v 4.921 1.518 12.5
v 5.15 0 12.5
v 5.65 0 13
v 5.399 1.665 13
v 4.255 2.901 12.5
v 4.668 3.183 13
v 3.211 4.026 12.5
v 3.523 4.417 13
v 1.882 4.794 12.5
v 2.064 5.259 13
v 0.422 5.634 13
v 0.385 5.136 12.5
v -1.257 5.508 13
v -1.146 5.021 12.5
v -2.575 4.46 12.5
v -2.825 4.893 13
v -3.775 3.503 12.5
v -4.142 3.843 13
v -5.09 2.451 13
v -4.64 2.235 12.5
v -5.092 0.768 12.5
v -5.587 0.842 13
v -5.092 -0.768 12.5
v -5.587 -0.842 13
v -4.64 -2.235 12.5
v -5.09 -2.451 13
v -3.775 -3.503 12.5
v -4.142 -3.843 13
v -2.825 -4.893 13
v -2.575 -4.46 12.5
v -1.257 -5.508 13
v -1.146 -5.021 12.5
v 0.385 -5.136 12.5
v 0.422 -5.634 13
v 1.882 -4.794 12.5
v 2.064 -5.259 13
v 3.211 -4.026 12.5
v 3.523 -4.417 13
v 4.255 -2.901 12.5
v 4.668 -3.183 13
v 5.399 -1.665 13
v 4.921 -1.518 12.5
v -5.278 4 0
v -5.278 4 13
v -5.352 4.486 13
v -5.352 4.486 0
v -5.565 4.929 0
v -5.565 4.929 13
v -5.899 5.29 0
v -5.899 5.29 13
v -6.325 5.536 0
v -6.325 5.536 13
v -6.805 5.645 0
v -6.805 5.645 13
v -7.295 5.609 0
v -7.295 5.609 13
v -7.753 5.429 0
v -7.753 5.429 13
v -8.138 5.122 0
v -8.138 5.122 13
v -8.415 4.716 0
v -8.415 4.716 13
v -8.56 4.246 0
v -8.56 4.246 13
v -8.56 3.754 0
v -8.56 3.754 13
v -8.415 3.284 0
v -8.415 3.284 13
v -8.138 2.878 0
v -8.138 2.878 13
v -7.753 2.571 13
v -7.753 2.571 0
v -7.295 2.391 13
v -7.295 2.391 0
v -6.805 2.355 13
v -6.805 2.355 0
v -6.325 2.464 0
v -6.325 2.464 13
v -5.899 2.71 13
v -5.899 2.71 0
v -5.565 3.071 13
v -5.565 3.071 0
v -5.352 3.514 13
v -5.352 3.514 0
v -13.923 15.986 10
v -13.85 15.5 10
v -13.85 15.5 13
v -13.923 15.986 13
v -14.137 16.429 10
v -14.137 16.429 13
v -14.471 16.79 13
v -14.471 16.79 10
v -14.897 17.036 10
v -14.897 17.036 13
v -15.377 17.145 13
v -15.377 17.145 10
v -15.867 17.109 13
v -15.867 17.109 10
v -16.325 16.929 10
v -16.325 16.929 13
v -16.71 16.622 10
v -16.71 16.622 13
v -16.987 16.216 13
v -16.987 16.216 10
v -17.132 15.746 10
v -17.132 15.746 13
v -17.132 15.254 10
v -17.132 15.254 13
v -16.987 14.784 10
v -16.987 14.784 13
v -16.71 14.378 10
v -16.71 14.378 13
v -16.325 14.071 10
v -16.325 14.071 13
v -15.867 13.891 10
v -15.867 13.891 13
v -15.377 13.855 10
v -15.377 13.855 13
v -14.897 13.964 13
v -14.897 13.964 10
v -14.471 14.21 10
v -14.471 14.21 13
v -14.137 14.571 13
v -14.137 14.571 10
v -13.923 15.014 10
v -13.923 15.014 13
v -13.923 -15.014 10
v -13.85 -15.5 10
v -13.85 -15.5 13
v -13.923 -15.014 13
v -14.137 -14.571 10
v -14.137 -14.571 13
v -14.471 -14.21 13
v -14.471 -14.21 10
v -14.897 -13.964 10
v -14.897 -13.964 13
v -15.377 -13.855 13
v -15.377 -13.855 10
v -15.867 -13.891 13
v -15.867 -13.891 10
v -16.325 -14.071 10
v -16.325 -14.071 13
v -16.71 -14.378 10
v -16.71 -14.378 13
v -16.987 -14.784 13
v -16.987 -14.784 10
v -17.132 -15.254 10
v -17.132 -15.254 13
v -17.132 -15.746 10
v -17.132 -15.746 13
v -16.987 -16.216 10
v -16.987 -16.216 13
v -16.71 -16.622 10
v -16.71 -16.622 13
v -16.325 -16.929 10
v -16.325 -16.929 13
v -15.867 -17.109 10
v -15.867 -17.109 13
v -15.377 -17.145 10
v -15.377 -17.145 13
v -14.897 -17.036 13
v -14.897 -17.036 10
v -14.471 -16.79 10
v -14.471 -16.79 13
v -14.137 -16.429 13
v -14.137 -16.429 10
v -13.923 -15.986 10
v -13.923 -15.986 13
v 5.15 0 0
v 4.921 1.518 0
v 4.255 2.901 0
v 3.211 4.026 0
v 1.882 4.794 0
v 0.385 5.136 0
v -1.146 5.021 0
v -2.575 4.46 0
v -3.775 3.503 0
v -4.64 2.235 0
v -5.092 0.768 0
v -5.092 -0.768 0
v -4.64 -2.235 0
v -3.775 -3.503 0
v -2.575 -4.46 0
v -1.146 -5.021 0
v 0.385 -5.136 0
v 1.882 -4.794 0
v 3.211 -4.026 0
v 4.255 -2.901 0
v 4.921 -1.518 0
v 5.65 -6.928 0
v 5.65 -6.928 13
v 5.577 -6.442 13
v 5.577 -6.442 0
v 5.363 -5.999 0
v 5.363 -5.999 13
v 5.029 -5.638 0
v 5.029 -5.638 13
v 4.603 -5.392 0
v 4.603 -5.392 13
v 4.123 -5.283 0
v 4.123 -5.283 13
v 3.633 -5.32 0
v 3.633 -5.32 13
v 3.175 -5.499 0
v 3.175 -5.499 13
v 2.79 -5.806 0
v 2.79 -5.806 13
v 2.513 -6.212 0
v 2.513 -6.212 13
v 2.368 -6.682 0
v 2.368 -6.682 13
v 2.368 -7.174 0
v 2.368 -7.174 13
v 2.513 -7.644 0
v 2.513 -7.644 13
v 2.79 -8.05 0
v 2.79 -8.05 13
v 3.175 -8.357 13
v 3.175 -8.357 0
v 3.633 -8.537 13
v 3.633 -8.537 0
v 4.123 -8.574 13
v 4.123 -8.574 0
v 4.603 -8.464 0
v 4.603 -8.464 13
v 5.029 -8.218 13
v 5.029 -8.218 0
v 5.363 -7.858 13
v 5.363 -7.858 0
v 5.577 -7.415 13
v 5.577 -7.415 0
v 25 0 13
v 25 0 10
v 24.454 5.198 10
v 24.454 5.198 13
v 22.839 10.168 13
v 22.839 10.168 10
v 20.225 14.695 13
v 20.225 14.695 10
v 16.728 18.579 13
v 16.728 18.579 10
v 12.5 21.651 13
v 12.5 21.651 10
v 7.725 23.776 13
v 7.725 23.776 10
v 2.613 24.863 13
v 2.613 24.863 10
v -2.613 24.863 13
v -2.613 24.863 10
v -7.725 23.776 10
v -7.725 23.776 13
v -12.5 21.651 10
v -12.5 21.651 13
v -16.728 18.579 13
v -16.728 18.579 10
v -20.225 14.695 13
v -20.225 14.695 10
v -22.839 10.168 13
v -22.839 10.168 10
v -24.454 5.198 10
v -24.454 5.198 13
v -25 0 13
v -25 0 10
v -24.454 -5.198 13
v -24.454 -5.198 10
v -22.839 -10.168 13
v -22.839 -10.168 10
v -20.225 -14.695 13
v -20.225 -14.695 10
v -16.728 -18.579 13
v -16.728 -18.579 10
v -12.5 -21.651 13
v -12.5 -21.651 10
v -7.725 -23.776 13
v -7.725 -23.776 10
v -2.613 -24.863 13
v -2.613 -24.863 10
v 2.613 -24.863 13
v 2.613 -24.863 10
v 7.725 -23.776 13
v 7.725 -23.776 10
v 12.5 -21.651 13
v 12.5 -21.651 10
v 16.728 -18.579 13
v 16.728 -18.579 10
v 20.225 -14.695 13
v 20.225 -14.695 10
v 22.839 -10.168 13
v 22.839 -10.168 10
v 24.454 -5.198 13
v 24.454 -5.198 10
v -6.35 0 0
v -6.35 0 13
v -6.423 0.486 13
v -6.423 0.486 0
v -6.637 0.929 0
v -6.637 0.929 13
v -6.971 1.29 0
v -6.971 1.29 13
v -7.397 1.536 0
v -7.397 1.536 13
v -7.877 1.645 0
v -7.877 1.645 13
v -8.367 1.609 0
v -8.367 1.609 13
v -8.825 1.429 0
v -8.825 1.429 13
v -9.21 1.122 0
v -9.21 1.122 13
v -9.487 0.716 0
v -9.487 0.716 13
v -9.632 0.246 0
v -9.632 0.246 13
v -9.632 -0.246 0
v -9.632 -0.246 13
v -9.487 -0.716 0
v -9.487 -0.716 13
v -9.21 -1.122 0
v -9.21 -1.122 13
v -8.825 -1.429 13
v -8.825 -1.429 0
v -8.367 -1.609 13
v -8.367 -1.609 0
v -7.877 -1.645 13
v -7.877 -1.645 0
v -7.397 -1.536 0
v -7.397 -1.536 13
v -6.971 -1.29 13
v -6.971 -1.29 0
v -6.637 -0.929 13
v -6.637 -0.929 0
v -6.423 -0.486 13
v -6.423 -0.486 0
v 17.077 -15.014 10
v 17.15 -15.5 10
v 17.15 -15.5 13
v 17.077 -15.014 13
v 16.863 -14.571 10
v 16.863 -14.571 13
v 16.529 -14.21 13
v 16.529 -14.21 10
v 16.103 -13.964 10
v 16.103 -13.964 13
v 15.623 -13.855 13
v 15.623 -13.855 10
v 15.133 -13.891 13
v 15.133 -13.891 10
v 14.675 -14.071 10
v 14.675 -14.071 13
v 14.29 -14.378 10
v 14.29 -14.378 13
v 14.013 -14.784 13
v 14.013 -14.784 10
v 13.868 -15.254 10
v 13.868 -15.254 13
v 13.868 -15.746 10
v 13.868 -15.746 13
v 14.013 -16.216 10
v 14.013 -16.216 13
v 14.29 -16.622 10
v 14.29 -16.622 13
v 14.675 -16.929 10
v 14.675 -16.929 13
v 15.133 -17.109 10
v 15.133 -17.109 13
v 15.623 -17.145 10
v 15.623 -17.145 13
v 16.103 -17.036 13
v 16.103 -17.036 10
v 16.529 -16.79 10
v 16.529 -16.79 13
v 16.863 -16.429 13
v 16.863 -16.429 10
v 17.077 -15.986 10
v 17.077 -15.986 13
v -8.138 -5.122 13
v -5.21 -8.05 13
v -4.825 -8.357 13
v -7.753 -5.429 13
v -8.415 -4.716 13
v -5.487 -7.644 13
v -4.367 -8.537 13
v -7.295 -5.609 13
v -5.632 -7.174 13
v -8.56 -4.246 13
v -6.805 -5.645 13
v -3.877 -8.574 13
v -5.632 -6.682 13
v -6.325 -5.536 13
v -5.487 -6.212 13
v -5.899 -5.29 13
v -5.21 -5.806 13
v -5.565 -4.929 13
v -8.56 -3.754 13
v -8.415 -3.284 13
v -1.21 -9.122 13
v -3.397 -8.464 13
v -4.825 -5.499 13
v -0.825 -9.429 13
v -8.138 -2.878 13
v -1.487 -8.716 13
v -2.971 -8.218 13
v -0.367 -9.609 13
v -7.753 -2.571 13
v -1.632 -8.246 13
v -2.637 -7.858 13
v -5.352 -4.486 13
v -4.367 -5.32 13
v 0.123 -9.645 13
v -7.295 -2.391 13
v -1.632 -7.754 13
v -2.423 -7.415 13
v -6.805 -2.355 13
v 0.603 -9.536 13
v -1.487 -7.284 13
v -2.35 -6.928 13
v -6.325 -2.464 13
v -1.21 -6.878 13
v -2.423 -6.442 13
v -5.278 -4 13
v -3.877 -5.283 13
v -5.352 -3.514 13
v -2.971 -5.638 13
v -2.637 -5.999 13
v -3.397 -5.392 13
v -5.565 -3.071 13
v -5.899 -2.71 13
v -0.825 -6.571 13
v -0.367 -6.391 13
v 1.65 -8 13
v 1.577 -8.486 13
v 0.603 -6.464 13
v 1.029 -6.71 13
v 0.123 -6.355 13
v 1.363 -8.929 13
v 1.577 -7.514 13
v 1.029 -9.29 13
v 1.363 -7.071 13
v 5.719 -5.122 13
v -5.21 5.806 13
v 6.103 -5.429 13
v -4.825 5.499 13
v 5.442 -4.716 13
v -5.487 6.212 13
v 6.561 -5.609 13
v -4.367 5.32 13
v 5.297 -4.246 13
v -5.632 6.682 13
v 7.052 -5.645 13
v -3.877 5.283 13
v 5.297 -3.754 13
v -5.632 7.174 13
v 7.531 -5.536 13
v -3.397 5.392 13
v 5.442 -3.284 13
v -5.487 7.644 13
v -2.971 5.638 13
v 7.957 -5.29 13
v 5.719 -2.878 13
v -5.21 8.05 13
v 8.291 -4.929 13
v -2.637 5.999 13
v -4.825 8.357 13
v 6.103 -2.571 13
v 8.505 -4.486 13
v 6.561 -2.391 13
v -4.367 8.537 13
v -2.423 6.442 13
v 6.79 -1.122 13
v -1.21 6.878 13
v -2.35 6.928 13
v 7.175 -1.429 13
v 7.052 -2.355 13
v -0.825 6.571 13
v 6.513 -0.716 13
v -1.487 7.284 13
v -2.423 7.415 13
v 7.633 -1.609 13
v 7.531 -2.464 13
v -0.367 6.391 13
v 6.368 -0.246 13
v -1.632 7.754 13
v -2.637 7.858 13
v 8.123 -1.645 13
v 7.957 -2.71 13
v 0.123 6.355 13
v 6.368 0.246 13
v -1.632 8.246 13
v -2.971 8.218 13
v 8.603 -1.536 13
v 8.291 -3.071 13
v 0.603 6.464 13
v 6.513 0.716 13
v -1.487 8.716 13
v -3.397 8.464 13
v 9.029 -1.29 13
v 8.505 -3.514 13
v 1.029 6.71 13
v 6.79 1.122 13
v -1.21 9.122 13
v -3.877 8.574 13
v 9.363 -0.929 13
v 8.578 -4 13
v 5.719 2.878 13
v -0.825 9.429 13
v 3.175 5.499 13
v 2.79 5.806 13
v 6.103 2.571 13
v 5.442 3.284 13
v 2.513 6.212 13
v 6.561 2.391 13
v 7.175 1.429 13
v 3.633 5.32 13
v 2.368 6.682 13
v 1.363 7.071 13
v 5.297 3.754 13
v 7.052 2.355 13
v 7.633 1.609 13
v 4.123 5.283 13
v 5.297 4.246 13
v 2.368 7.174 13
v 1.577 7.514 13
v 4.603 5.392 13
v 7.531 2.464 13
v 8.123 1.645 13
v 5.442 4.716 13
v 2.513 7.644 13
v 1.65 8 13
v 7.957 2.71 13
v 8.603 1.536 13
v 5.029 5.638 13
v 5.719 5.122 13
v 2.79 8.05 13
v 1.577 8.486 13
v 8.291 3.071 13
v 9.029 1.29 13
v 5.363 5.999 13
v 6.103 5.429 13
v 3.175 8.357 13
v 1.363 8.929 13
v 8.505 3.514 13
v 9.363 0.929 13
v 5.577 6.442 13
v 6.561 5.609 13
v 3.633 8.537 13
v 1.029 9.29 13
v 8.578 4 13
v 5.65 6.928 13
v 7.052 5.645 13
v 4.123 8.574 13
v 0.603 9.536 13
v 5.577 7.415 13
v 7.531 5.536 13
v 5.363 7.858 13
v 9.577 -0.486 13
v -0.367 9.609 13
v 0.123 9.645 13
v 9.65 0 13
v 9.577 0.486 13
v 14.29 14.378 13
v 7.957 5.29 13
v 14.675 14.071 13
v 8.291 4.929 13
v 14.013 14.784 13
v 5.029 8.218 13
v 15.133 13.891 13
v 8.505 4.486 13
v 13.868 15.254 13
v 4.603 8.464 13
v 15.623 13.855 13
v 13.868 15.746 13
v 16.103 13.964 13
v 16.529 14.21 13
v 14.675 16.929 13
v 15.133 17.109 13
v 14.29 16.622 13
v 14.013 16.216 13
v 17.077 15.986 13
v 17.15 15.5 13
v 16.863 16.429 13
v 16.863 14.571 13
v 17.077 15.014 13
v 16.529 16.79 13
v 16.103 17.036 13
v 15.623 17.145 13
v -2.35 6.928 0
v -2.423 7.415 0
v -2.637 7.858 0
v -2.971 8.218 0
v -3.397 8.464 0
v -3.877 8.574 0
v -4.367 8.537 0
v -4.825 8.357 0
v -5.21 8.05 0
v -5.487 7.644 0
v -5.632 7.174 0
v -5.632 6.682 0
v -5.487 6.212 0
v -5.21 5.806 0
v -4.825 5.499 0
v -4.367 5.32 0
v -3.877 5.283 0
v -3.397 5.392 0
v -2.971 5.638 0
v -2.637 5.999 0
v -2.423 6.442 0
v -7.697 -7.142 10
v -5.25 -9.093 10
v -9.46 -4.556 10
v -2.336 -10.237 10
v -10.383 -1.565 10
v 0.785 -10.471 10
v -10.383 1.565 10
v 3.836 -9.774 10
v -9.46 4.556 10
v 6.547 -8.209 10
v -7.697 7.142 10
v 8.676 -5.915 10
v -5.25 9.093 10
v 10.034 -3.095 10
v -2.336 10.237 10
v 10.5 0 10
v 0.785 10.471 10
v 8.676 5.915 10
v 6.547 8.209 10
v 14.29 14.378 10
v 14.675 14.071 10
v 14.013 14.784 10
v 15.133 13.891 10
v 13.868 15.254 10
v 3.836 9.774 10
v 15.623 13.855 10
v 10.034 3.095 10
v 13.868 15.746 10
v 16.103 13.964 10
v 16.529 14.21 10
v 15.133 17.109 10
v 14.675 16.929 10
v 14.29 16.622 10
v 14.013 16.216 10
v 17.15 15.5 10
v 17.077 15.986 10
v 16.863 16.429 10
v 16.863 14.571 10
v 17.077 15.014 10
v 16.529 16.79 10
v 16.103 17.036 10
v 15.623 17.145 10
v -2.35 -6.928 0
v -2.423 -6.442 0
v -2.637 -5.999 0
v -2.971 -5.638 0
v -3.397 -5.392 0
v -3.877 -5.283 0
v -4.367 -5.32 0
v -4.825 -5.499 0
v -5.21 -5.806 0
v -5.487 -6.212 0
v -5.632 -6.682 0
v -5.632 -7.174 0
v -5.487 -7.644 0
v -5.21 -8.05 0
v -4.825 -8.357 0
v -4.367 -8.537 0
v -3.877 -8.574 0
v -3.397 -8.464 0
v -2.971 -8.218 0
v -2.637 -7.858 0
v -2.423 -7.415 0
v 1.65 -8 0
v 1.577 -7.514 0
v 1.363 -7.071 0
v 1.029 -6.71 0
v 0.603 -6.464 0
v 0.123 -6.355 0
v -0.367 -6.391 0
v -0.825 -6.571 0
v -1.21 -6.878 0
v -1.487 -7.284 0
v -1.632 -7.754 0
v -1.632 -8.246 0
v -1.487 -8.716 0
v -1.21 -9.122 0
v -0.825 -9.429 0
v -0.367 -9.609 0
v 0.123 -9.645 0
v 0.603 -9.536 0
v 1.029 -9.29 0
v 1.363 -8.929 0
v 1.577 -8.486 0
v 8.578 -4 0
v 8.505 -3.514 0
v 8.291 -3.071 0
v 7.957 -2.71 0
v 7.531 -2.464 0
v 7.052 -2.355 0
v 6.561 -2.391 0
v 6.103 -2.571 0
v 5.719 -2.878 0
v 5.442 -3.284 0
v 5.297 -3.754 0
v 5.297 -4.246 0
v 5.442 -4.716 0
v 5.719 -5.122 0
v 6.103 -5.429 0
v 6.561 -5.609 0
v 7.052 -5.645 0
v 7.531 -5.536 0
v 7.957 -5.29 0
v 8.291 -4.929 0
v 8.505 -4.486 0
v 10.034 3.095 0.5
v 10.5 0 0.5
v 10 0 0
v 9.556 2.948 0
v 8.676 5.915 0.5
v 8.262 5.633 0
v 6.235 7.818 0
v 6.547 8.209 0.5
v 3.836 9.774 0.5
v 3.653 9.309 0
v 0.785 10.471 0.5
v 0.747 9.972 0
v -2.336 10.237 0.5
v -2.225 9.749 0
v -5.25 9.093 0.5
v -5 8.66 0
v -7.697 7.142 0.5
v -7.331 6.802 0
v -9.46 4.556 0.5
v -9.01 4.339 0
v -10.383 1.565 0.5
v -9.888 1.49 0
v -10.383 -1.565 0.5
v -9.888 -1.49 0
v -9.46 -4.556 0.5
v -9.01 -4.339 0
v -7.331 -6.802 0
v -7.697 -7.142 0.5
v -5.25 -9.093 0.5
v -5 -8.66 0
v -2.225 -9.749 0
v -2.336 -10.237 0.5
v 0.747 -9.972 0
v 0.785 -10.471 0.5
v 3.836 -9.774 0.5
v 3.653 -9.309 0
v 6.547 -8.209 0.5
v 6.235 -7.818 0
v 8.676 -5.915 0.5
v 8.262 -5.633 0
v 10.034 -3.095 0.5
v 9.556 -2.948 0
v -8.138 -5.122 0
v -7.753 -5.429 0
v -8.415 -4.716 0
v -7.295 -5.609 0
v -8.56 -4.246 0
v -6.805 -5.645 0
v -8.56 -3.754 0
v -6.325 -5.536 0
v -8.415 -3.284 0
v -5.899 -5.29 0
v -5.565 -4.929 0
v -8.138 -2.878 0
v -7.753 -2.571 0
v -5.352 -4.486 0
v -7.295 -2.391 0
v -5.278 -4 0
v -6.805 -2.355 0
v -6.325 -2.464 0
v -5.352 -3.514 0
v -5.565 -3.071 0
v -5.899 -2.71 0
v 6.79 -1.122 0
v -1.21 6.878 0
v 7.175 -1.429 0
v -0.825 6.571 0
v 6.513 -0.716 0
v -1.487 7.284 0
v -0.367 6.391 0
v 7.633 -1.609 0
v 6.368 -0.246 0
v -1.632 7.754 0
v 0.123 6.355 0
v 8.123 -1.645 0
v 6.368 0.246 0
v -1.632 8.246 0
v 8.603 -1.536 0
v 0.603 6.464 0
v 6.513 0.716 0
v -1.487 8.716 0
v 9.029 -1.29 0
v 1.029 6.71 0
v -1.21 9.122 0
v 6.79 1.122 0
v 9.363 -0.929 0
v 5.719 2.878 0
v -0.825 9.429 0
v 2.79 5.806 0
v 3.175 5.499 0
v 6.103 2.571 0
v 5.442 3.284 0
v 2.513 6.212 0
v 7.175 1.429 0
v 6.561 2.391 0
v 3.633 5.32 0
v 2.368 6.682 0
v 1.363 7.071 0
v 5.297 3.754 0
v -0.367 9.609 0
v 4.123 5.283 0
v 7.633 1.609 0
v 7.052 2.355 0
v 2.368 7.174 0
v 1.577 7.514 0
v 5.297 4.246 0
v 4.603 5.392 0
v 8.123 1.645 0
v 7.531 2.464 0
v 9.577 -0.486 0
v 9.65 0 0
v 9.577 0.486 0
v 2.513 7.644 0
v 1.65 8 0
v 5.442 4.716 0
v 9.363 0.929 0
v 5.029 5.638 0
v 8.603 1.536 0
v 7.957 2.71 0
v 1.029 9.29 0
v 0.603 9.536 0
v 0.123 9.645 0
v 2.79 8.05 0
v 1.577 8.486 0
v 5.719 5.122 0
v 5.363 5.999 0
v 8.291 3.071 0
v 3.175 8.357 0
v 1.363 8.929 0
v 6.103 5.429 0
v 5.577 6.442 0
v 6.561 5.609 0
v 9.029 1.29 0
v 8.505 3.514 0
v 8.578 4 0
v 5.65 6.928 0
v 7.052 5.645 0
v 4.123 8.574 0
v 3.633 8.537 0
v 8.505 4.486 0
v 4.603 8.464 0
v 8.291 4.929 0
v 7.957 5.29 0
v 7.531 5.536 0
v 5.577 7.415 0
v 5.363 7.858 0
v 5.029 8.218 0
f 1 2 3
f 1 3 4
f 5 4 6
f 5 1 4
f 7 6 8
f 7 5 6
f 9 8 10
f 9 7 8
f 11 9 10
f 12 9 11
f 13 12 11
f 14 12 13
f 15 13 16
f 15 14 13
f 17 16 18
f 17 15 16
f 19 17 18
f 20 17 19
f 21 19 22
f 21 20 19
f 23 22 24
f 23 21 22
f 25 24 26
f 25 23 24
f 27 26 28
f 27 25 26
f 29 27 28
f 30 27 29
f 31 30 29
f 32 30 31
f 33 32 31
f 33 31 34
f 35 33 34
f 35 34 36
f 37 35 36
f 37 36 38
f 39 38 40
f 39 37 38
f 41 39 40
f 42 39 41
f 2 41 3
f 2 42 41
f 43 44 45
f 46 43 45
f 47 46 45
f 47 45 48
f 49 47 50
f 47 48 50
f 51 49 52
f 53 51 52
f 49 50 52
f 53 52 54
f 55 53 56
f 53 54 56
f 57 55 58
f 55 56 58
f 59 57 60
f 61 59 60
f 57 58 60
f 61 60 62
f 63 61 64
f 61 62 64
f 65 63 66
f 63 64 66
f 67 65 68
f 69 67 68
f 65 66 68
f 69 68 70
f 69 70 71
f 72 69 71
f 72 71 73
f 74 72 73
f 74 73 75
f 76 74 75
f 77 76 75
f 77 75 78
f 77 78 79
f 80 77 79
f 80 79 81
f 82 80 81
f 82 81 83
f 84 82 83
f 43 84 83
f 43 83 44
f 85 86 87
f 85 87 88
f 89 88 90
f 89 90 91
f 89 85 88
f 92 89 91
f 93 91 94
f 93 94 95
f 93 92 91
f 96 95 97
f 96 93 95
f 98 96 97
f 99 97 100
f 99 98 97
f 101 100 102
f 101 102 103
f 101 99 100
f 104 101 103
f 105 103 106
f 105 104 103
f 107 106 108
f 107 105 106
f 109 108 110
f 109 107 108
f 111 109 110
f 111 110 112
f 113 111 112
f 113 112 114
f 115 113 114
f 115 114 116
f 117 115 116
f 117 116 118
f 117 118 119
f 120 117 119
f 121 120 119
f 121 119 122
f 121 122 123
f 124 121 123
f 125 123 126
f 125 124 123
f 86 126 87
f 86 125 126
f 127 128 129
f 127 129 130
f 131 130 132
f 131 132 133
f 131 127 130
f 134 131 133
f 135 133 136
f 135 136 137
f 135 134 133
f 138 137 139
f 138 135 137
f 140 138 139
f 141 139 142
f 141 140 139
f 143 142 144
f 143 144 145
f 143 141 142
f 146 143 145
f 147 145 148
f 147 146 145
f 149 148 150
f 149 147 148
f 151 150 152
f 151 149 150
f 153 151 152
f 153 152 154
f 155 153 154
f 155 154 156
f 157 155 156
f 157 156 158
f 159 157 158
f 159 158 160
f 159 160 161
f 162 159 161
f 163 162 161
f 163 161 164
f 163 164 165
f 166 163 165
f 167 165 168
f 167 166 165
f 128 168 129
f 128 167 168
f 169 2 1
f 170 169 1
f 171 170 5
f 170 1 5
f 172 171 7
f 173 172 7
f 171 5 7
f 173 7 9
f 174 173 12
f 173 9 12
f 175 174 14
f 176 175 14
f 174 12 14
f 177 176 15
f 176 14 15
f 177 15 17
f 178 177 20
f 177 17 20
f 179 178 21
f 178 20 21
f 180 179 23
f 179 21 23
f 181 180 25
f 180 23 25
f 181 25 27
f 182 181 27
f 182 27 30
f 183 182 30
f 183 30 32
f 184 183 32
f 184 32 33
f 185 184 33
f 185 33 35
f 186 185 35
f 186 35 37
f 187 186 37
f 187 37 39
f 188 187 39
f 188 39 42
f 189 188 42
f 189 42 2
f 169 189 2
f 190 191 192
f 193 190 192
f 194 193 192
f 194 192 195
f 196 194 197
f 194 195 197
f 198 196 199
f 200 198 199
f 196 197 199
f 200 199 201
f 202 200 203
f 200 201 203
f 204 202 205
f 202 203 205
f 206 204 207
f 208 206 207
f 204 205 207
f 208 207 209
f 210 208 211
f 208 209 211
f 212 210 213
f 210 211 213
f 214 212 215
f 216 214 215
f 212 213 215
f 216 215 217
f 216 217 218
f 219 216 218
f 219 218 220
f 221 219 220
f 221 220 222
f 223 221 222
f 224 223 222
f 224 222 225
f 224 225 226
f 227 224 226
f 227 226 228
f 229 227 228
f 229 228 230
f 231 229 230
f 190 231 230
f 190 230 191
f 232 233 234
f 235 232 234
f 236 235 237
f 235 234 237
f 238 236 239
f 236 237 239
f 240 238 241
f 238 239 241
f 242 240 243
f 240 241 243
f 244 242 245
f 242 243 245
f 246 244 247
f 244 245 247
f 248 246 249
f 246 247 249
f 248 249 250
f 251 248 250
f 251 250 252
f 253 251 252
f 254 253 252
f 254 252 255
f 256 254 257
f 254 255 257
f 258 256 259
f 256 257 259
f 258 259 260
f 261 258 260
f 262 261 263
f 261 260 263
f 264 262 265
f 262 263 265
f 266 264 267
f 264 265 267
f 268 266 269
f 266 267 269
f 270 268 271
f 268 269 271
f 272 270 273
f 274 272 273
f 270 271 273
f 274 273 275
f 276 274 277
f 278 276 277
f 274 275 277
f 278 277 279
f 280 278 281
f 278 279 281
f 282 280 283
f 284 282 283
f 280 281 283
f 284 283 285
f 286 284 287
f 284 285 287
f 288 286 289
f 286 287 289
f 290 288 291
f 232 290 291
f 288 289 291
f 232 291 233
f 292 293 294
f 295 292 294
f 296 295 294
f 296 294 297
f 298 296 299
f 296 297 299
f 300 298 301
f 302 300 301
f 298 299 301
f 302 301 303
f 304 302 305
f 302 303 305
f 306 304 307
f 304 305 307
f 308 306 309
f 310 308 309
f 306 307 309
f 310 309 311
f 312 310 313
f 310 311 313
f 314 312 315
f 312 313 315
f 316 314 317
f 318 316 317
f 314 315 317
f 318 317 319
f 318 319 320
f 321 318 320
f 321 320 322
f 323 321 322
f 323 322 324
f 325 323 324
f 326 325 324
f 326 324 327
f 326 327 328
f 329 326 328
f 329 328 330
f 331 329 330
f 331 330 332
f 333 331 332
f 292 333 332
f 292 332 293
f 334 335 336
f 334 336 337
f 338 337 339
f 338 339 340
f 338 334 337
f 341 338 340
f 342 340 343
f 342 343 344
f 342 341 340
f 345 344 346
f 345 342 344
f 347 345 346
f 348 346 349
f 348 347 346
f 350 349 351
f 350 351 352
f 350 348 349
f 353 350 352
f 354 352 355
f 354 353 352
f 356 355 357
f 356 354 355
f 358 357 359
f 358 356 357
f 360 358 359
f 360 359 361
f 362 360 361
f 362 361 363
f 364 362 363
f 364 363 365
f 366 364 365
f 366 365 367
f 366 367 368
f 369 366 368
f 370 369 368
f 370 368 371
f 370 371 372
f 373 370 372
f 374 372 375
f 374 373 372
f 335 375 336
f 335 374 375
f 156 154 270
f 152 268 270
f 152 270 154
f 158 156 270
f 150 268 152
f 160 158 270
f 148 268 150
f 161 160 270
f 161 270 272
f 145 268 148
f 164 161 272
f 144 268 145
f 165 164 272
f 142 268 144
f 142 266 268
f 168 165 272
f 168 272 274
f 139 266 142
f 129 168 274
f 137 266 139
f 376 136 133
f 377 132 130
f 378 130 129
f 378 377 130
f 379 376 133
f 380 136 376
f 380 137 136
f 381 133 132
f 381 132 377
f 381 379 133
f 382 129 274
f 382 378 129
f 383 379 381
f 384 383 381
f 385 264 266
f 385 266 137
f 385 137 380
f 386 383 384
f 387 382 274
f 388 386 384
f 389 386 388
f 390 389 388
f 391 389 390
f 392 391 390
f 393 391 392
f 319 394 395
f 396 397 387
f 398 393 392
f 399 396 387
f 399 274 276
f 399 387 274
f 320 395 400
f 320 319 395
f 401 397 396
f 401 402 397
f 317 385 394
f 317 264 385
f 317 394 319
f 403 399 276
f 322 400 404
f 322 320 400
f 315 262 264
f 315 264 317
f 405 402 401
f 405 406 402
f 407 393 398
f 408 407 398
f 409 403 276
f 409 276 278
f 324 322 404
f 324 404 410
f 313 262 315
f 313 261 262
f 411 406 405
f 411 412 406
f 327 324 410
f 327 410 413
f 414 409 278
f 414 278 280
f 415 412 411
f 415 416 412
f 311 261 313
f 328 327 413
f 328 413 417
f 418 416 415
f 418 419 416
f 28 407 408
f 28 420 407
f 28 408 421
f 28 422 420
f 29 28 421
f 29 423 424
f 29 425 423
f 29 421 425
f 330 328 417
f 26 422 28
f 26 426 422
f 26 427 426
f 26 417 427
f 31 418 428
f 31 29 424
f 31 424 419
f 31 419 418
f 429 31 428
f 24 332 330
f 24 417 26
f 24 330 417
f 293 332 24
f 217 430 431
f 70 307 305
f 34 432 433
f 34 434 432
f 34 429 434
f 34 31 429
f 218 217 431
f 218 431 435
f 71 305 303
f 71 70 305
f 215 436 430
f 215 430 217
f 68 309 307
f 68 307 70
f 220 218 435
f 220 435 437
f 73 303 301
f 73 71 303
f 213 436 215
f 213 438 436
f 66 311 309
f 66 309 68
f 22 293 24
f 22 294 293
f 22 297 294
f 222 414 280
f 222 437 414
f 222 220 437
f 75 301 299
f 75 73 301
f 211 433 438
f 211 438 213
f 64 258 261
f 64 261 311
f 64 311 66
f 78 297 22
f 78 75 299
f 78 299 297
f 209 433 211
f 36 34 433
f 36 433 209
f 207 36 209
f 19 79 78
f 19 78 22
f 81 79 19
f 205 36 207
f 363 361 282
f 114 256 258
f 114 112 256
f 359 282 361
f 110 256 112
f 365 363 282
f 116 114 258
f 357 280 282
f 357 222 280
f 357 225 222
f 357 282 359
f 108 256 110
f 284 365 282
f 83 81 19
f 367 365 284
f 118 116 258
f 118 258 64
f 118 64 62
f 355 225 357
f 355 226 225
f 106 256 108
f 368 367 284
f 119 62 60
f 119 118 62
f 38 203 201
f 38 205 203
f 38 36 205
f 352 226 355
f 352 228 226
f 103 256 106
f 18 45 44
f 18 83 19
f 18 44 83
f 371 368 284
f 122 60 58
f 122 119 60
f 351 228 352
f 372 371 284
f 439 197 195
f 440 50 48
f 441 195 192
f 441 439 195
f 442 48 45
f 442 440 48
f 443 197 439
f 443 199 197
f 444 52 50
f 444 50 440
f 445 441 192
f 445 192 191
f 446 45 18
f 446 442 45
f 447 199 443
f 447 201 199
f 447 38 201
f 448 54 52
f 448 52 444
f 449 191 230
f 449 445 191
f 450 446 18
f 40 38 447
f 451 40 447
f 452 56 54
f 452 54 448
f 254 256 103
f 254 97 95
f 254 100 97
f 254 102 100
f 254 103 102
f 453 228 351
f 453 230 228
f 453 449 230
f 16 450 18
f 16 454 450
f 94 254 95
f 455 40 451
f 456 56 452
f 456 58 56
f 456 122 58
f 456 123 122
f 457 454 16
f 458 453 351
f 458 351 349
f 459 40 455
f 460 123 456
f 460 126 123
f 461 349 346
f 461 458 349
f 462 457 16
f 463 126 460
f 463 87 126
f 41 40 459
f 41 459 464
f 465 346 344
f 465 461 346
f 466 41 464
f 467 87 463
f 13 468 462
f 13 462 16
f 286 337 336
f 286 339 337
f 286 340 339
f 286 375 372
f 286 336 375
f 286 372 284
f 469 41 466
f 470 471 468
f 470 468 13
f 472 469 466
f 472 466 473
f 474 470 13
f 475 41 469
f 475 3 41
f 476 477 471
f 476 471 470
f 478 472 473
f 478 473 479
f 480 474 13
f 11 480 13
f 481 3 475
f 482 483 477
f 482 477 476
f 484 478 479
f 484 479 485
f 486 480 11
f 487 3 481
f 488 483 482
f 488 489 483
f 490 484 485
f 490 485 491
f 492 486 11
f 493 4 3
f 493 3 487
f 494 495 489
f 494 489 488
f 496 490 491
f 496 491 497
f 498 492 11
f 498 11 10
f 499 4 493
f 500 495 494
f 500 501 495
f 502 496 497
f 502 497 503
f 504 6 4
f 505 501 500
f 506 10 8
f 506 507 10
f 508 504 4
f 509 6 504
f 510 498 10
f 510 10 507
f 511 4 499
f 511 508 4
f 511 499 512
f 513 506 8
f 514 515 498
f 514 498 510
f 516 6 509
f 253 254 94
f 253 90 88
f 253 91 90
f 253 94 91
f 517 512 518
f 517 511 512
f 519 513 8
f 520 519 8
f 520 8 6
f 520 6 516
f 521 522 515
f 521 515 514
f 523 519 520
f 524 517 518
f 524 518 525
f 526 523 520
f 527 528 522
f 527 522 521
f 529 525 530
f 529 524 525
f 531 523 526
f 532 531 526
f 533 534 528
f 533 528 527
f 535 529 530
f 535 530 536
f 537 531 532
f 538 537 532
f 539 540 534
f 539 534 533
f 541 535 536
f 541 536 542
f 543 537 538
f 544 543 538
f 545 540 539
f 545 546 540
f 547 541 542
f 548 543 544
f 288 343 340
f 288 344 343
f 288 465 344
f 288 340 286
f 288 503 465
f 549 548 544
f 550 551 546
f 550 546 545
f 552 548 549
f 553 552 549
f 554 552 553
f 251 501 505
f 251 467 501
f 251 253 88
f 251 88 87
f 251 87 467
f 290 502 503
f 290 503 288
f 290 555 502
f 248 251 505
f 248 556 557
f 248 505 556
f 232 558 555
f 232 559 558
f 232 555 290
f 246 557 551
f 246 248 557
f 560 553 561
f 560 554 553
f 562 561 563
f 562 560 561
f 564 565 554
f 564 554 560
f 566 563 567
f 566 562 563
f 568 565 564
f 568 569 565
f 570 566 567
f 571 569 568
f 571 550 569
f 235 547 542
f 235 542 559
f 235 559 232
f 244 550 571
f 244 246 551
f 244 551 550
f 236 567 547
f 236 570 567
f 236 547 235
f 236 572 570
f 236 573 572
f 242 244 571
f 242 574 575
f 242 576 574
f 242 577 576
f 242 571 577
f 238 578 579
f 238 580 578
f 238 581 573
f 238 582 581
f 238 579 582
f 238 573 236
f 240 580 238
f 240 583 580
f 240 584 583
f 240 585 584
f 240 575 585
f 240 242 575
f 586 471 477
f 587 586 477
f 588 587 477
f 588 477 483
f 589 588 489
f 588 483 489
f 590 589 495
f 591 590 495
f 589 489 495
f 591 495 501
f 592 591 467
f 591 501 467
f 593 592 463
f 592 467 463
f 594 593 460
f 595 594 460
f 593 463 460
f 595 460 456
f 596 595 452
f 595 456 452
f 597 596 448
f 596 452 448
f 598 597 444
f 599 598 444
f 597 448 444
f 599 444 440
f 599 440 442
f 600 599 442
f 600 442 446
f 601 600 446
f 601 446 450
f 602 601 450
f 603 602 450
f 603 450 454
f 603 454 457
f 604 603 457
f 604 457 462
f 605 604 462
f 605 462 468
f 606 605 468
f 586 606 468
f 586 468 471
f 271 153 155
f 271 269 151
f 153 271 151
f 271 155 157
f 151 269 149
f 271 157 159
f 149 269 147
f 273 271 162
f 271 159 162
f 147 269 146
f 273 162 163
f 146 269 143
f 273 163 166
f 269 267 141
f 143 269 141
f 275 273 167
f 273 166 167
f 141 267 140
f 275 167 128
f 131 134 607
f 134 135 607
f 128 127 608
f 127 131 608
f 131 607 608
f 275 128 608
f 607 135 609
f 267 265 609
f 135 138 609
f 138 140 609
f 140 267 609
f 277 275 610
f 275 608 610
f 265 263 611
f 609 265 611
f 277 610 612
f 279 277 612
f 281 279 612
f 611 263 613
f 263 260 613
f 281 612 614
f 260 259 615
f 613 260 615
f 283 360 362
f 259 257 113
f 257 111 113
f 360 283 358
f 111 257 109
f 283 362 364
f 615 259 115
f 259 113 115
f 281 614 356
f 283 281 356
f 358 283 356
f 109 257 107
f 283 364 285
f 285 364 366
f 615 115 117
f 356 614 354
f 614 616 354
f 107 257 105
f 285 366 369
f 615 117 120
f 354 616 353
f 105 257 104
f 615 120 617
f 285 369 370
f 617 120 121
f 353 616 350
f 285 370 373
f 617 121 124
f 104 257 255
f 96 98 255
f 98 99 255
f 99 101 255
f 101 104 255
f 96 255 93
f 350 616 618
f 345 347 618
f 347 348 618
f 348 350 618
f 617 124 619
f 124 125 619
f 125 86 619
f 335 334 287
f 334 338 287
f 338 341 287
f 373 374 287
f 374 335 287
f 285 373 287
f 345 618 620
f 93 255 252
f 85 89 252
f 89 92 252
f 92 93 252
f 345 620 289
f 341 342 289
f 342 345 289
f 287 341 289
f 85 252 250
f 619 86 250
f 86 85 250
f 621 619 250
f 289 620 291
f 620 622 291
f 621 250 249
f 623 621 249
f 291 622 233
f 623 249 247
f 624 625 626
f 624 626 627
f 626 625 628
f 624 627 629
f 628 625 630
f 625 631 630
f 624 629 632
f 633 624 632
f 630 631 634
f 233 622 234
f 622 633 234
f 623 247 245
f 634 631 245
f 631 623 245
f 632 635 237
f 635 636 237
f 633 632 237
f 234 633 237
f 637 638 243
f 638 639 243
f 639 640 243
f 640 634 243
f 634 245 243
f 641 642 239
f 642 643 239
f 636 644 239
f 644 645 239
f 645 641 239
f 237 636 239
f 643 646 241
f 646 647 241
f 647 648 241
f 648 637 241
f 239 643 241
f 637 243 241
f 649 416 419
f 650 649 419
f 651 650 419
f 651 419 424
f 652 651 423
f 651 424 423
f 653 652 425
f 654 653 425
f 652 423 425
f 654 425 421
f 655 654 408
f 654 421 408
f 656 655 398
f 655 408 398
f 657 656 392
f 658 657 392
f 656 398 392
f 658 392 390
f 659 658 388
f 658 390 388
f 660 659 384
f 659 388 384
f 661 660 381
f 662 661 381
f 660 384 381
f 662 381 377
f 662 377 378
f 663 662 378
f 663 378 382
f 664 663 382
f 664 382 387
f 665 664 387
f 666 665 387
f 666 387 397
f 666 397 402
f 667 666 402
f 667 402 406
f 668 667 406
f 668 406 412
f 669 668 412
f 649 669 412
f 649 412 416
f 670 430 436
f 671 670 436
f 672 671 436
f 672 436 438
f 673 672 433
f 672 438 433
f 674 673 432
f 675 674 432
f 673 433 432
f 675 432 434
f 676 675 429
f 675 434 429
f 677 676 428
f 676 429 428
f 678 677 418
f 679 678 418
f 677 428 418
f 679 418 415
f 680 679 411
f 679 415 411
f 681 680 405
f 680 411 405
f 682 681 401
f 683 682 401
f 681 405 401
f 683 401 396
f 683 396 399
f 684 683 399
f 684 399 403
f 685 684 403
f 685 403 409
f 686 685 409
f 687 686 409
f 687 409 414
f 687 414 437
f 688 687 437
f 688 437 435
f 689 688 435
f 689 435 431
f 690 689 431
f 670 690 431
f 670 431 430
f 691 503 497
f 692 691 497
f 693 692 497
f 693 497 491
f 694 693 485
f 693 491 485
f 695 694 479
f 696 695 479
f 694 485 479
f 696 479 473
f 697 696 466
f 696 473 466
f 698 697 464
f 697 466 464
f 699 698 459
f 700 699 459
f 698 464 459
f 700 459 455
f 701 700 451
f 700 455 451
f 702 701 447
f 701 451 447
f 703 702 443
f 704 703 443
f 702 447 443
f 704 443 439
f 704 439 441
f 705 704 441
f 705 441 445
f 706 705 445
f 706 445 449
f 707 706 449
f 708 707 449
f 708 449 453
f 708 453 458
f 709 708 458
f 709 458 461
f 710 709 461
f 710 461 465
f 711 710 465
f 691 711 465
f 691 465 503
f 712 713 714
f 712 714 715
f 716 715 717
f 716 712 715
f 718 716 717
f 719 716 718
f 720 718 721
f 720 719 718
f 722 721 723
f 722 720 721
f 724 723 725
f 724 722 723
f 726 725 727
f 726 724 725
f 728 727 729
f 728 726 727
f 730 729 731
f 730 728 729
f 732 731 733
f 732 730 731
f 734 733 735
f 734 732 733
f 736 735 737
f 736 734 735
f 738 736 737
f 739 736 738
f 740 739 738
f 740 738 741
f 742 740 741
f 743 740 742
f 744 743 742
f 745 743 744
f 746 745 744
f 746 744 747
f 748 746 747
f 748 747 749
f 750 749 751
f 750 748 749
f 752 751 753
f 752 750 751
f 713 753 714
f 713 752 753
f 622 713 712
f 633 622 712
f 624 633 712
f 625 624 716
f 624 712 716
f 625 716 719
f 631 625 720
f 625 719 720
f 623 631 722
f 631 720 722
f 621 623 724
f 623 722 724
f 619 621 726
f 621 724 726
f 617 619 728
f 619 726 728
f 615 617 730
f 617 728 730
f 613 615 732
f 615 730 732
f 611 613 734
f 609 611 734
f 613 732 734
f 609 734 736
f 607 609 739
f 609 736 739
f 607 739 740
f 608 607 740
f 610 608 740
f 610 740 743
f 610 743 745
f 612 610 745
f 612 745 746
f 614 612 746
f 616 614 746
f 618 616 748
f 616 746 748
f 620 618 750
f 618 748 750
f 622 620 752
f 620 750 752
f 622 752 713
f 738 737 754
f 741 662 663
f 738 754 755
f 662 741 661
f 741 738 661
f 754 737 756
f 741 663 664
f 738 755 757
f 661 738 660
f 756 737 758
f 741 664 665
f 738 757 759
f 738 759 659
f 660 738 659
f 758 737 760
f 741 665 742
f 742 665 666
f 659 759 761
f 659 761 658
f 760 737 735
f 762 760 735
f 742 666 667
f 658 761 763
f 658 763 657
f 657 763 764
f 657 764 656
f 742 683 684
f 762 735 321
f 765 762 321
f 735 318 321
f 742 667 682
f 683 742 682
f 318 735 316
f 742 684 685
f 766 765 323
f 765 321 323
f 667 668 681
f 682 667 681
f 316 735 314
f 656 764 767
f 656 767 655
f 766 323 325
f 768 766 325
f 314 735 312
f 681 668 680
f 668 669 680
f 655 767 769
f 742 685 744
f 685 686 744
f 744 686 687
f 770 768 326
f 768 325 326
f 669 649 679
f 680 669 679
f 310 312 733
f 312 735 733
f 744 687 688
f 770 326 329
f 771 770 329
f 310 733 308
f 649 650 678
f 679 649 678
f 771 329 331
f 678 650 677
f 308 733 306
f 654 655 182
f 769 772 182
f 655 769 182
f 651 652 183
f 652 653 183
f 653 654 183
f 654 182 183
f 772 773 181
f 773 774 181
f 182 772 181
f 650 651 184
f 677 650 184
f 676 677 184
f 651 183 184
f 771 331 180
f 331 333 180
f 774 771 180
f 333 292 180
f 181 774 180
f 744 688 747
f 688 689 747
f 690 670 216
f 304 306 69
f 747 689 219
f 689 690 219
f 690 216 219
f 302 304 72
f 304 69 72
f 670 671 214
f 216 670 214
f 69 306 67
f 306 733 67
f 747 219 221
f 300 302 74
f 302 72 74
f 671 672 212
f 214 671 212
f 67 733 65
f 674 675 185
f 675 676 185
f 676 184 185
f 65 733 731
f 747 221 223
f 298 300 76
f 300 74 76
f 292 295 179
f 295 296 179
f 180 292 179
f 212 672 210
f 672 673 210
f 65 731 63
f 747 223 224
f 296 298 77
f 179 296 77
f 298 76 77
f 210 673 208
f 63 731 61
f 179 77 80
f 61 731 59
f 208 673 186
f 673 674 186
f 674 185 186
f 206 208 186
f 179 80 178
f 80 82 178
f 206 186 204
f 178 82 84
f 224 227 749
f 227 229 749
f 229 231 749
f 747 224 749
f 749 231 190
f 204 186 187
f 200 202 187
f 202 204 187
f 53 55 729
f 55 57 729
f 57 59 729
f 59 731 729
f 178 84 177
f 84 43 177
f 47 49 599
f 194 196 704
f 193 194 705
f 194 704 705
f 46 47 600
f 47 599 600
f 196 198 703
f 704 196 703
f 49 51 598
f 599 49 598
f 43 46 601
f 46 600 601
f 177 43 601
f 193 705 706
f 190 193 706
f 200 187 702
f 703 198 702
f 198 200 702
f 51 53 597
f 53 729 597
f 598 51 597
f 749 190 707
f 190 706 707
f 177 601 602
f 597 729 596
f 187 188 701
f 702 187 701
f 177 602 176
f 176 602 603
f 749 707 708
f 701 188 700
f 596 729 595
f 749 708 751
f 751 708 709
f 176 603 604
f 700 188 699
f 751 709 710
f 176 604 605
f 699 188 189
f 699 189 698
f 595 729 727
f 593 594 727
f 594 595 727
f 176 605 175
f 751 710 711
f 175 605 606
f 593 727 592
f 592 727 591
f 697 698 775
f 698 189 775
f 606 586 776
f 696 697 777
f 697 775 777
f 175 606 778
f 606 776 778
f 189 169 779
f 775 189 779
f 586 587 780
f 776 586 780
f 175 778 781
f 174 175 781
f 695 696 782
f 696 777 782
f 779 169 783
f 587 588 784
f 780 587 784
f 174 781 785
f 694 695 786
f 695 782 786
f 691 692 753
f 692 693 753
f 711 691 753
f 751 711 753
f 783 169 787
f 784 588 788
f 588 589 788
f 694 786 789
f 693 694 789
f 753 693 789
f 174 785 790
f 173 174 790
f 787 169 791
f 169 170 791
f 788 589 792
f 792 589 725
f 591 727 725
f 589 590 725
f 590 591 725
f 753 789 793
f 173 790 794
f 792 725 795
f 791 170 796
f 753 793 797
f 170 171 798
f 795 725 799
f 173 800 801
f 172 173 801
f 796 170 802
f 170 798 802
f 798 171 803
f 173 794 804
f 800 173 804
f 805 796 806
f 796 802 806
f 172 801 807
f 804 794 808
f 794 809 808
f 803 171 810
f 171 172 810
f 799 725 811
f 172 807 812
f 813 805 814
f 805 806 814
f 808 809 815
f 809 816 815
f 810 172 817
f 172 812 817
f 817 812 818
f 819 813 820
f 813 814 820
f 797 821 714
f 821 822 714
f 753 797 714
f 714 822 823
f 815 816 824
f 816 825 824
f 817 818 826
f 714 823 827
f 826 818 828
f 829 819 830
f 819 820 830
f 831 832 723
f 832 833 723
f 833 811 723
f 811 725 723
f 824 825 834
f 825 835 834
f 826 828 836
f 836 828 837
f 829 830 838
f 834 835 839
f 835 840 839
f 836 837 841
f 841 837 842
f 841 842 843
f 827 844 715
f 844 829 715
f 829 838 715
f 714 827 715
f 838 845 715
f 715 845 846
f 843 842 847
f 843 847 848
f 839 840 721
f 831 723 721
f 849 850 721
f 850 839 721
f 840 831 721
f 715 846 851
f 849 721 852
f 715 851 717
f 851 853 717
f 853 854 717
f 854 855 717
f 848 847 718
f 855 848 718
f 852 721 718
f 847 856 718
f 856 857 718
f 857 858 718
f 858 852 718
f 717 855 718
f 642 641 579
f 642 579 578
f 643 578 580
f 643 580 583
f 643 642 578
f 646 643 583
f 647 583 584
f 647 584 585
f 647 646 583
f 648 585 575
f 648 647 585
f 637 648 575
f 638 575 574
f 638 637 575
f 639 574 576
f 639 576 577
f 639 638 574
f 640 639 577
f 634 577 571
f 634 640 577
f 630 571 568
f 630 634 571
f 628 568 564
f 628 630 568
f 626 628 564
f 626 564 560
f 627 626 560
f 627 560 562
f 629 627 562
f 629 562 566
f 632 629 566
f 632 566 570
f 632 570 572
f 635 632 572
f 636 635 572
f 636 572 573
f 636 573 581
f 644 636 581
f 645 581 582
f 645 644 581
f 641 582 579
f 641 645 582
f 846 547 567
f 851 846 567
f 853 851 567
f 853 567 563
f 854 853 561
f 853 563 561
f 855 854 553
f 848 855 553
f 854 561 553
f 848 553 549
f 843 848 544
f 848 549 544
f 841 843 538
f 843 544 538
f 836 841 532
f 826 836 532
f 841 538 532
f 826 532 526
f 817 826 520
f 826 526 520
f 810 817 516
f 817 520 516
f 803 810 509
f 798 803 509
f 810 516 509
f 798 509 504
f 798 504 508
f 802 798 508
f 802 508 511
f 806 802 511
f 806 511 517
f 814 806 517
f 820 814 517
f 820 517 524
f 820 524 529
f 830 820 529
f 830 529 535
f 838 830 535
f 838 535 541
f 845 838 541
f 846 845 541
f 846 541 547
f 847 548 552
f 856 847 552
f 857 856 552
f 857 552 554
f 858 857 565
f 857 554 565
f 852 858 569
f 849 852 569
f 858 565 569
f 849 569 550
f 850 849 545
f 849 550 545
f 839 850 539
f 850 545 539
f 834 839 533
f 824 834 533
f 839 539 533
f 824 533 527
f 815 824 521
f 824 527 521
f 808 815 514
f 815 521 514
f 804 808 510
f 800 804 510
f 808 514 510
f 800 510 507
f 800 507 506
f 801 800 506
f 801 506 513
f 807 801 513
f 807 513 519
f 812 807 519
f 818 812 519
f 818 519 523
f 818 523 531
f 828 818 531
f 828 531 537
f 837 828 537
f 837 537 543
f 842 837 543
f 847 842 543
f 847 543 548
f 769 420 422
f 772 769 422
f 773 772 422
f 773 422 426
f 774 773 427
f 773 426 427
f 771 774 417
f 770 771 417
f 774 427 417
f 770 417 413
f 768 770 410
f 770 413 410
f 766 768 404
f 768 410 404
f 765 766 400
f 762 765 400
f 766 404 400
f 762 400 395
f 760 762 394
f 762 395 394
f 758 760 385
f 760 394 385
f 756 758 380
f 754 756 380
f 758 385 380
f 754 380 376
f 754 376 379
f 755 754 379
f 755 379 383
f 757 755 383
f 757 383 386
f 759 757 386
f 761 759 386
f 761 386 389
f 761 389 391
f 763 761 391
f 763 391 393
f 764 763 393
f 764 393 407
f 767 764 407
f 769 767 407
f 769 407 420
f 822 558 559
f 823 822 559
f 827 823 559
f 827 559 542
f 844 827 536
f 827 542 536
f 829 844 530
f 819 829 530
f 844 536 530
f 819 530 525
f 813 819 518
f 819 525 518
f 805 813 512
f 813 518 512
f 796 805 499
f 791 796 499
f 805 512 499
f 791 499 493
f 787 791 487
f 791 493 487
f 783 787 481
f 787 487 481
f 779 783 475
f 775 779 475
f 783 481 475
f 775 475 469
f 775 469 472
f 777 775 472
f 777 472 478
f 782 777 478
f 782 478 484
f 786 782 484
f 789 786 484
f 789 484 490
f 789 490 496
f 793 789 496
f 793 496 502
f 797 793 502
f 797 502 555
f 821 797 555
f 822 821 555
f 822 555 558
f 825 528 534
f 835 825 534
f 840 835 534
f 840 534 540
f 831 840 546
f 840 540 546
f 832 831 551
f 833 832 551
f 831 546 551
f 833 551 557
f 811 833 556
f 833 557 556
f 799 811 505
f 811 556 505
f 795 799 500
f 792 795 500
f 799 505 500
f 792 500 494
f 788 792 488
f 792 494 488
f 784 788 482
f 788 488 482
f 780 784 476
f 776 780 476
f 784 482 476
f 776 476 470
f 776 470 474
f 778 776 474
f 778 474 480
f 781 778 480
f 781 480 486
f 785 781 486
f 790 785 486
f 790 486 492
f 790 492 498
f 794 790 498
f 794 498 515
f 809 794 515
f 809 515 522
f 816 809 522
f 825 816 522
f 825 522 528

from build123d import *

# Parameters (mm, degrees)
SKETCH_R        = 10.5
PAD_DEPTH       = 10
SKETCH001_R     = 25
SKETCH001_R_2   = 1.65
PAD001_DEPTH    = 3
SKETCH002_R     = 5.15
POCKET_DEPTH    = 13.001
SKETCH003_R     = 1.65
POCKET001_DEPTH = 13.001
CHAMFER_SIZE    = 0.5
CHAMFER001_SIZE = 0.5


with BuildPart() as part:
    # Sketch → Pad (new body)
    with BuildSketch(Plane.XY):
        Circle(SKETCH_R)
    extrude(amount=PAD_DEPTH)

    # Sketch001 (on Face3 of Pad) → Pad001 (join)
    with BuildSketch(Plane.XY.offset(10)):
        Circle(SKETCH001_R)
        with Locations((-15.5, -15.5)):
            Circle(SKETCH001_R_2, mode=Mode.SUBTRACT)
        with Locations((15.5, -15.5)):
            Circle(SKETCH001_R_2, mode=Mode.SUBTRACT)
        with Locations((15.5, 15.5)):
            Circle(SKETCH001_R_2, mode=Mode.SUBTRACT)
        with Locations((-15.5, 15.5)):
            Circle(SKETCH001_R_2, mode=Mode.SUBTRACT)
    extrude(amount=PAD001_DEPTH)

    # Sketch002 (on Face3 of Pad001) → Pocket (cut, through all)
    with BuildSketch(Plane.XY.offset(13)):
        Circle(SKETCH002_R)
    extrude(amount=-POCKET_DEPTH, mode=Mode.SUBTRACT)

    # Sketch003 (on Face3 of Pocket) → Pocket001 (cut, through all)
    with BuildSketch(Plane.XY.offset(13)):
        with Locations((0, 8)):
            Circle(SKETCH003_R)
        with Locations((4, 6.928203)):
            Circle(SKETCH003_R)
        with Locations((6.928203, 4)):
            Circle(SKETCH003_R)
        with Locations((8, 0)):
            Circle(SKETCH003_R)
        with Locations((6.928203, -4)):
            Circle(SKETCH003_R)
        with Locations((4, -6.928203)):
            Circle(SKETCH003_R)
        with Locations((0, -8)):
            Circle(SKETCH003_R)
        with Locations((-4, -6.928203)):
            Circle(SKETCH003_R)
        with Locations((-6.928203, -4)):
            Circle(SKETCH003_R)
        with Locations((-8, 0)):
            Circle(SKETCH003_R)
        with Locations((-6.928203, 4)):
            Circle(SKETCH003_R)
        with Locations((-4, 6.928203)):
            Circle(SKETCH003_R)
    extrude(amount=-POCKET001_DEPTH, mode=Mode.SUBTRACT)

    # Chamfer
    chamfer_edges = [part.edges().sort_by_distance(p)[0] for p in [
        (-5.15, 0, 13),
    ]]
    chamfer(chamfer_edges, length=CHAMFER_SIZE)

    # Chamfer001
    chamfer001_edges = [part.edges().sort_by_distance(p)[0] for p in [
        (-10.5, 0, 0),
    ]]
    chamfer(chamfer001_edges, length=CHAMFER001_SIZE)


solid = part.part
